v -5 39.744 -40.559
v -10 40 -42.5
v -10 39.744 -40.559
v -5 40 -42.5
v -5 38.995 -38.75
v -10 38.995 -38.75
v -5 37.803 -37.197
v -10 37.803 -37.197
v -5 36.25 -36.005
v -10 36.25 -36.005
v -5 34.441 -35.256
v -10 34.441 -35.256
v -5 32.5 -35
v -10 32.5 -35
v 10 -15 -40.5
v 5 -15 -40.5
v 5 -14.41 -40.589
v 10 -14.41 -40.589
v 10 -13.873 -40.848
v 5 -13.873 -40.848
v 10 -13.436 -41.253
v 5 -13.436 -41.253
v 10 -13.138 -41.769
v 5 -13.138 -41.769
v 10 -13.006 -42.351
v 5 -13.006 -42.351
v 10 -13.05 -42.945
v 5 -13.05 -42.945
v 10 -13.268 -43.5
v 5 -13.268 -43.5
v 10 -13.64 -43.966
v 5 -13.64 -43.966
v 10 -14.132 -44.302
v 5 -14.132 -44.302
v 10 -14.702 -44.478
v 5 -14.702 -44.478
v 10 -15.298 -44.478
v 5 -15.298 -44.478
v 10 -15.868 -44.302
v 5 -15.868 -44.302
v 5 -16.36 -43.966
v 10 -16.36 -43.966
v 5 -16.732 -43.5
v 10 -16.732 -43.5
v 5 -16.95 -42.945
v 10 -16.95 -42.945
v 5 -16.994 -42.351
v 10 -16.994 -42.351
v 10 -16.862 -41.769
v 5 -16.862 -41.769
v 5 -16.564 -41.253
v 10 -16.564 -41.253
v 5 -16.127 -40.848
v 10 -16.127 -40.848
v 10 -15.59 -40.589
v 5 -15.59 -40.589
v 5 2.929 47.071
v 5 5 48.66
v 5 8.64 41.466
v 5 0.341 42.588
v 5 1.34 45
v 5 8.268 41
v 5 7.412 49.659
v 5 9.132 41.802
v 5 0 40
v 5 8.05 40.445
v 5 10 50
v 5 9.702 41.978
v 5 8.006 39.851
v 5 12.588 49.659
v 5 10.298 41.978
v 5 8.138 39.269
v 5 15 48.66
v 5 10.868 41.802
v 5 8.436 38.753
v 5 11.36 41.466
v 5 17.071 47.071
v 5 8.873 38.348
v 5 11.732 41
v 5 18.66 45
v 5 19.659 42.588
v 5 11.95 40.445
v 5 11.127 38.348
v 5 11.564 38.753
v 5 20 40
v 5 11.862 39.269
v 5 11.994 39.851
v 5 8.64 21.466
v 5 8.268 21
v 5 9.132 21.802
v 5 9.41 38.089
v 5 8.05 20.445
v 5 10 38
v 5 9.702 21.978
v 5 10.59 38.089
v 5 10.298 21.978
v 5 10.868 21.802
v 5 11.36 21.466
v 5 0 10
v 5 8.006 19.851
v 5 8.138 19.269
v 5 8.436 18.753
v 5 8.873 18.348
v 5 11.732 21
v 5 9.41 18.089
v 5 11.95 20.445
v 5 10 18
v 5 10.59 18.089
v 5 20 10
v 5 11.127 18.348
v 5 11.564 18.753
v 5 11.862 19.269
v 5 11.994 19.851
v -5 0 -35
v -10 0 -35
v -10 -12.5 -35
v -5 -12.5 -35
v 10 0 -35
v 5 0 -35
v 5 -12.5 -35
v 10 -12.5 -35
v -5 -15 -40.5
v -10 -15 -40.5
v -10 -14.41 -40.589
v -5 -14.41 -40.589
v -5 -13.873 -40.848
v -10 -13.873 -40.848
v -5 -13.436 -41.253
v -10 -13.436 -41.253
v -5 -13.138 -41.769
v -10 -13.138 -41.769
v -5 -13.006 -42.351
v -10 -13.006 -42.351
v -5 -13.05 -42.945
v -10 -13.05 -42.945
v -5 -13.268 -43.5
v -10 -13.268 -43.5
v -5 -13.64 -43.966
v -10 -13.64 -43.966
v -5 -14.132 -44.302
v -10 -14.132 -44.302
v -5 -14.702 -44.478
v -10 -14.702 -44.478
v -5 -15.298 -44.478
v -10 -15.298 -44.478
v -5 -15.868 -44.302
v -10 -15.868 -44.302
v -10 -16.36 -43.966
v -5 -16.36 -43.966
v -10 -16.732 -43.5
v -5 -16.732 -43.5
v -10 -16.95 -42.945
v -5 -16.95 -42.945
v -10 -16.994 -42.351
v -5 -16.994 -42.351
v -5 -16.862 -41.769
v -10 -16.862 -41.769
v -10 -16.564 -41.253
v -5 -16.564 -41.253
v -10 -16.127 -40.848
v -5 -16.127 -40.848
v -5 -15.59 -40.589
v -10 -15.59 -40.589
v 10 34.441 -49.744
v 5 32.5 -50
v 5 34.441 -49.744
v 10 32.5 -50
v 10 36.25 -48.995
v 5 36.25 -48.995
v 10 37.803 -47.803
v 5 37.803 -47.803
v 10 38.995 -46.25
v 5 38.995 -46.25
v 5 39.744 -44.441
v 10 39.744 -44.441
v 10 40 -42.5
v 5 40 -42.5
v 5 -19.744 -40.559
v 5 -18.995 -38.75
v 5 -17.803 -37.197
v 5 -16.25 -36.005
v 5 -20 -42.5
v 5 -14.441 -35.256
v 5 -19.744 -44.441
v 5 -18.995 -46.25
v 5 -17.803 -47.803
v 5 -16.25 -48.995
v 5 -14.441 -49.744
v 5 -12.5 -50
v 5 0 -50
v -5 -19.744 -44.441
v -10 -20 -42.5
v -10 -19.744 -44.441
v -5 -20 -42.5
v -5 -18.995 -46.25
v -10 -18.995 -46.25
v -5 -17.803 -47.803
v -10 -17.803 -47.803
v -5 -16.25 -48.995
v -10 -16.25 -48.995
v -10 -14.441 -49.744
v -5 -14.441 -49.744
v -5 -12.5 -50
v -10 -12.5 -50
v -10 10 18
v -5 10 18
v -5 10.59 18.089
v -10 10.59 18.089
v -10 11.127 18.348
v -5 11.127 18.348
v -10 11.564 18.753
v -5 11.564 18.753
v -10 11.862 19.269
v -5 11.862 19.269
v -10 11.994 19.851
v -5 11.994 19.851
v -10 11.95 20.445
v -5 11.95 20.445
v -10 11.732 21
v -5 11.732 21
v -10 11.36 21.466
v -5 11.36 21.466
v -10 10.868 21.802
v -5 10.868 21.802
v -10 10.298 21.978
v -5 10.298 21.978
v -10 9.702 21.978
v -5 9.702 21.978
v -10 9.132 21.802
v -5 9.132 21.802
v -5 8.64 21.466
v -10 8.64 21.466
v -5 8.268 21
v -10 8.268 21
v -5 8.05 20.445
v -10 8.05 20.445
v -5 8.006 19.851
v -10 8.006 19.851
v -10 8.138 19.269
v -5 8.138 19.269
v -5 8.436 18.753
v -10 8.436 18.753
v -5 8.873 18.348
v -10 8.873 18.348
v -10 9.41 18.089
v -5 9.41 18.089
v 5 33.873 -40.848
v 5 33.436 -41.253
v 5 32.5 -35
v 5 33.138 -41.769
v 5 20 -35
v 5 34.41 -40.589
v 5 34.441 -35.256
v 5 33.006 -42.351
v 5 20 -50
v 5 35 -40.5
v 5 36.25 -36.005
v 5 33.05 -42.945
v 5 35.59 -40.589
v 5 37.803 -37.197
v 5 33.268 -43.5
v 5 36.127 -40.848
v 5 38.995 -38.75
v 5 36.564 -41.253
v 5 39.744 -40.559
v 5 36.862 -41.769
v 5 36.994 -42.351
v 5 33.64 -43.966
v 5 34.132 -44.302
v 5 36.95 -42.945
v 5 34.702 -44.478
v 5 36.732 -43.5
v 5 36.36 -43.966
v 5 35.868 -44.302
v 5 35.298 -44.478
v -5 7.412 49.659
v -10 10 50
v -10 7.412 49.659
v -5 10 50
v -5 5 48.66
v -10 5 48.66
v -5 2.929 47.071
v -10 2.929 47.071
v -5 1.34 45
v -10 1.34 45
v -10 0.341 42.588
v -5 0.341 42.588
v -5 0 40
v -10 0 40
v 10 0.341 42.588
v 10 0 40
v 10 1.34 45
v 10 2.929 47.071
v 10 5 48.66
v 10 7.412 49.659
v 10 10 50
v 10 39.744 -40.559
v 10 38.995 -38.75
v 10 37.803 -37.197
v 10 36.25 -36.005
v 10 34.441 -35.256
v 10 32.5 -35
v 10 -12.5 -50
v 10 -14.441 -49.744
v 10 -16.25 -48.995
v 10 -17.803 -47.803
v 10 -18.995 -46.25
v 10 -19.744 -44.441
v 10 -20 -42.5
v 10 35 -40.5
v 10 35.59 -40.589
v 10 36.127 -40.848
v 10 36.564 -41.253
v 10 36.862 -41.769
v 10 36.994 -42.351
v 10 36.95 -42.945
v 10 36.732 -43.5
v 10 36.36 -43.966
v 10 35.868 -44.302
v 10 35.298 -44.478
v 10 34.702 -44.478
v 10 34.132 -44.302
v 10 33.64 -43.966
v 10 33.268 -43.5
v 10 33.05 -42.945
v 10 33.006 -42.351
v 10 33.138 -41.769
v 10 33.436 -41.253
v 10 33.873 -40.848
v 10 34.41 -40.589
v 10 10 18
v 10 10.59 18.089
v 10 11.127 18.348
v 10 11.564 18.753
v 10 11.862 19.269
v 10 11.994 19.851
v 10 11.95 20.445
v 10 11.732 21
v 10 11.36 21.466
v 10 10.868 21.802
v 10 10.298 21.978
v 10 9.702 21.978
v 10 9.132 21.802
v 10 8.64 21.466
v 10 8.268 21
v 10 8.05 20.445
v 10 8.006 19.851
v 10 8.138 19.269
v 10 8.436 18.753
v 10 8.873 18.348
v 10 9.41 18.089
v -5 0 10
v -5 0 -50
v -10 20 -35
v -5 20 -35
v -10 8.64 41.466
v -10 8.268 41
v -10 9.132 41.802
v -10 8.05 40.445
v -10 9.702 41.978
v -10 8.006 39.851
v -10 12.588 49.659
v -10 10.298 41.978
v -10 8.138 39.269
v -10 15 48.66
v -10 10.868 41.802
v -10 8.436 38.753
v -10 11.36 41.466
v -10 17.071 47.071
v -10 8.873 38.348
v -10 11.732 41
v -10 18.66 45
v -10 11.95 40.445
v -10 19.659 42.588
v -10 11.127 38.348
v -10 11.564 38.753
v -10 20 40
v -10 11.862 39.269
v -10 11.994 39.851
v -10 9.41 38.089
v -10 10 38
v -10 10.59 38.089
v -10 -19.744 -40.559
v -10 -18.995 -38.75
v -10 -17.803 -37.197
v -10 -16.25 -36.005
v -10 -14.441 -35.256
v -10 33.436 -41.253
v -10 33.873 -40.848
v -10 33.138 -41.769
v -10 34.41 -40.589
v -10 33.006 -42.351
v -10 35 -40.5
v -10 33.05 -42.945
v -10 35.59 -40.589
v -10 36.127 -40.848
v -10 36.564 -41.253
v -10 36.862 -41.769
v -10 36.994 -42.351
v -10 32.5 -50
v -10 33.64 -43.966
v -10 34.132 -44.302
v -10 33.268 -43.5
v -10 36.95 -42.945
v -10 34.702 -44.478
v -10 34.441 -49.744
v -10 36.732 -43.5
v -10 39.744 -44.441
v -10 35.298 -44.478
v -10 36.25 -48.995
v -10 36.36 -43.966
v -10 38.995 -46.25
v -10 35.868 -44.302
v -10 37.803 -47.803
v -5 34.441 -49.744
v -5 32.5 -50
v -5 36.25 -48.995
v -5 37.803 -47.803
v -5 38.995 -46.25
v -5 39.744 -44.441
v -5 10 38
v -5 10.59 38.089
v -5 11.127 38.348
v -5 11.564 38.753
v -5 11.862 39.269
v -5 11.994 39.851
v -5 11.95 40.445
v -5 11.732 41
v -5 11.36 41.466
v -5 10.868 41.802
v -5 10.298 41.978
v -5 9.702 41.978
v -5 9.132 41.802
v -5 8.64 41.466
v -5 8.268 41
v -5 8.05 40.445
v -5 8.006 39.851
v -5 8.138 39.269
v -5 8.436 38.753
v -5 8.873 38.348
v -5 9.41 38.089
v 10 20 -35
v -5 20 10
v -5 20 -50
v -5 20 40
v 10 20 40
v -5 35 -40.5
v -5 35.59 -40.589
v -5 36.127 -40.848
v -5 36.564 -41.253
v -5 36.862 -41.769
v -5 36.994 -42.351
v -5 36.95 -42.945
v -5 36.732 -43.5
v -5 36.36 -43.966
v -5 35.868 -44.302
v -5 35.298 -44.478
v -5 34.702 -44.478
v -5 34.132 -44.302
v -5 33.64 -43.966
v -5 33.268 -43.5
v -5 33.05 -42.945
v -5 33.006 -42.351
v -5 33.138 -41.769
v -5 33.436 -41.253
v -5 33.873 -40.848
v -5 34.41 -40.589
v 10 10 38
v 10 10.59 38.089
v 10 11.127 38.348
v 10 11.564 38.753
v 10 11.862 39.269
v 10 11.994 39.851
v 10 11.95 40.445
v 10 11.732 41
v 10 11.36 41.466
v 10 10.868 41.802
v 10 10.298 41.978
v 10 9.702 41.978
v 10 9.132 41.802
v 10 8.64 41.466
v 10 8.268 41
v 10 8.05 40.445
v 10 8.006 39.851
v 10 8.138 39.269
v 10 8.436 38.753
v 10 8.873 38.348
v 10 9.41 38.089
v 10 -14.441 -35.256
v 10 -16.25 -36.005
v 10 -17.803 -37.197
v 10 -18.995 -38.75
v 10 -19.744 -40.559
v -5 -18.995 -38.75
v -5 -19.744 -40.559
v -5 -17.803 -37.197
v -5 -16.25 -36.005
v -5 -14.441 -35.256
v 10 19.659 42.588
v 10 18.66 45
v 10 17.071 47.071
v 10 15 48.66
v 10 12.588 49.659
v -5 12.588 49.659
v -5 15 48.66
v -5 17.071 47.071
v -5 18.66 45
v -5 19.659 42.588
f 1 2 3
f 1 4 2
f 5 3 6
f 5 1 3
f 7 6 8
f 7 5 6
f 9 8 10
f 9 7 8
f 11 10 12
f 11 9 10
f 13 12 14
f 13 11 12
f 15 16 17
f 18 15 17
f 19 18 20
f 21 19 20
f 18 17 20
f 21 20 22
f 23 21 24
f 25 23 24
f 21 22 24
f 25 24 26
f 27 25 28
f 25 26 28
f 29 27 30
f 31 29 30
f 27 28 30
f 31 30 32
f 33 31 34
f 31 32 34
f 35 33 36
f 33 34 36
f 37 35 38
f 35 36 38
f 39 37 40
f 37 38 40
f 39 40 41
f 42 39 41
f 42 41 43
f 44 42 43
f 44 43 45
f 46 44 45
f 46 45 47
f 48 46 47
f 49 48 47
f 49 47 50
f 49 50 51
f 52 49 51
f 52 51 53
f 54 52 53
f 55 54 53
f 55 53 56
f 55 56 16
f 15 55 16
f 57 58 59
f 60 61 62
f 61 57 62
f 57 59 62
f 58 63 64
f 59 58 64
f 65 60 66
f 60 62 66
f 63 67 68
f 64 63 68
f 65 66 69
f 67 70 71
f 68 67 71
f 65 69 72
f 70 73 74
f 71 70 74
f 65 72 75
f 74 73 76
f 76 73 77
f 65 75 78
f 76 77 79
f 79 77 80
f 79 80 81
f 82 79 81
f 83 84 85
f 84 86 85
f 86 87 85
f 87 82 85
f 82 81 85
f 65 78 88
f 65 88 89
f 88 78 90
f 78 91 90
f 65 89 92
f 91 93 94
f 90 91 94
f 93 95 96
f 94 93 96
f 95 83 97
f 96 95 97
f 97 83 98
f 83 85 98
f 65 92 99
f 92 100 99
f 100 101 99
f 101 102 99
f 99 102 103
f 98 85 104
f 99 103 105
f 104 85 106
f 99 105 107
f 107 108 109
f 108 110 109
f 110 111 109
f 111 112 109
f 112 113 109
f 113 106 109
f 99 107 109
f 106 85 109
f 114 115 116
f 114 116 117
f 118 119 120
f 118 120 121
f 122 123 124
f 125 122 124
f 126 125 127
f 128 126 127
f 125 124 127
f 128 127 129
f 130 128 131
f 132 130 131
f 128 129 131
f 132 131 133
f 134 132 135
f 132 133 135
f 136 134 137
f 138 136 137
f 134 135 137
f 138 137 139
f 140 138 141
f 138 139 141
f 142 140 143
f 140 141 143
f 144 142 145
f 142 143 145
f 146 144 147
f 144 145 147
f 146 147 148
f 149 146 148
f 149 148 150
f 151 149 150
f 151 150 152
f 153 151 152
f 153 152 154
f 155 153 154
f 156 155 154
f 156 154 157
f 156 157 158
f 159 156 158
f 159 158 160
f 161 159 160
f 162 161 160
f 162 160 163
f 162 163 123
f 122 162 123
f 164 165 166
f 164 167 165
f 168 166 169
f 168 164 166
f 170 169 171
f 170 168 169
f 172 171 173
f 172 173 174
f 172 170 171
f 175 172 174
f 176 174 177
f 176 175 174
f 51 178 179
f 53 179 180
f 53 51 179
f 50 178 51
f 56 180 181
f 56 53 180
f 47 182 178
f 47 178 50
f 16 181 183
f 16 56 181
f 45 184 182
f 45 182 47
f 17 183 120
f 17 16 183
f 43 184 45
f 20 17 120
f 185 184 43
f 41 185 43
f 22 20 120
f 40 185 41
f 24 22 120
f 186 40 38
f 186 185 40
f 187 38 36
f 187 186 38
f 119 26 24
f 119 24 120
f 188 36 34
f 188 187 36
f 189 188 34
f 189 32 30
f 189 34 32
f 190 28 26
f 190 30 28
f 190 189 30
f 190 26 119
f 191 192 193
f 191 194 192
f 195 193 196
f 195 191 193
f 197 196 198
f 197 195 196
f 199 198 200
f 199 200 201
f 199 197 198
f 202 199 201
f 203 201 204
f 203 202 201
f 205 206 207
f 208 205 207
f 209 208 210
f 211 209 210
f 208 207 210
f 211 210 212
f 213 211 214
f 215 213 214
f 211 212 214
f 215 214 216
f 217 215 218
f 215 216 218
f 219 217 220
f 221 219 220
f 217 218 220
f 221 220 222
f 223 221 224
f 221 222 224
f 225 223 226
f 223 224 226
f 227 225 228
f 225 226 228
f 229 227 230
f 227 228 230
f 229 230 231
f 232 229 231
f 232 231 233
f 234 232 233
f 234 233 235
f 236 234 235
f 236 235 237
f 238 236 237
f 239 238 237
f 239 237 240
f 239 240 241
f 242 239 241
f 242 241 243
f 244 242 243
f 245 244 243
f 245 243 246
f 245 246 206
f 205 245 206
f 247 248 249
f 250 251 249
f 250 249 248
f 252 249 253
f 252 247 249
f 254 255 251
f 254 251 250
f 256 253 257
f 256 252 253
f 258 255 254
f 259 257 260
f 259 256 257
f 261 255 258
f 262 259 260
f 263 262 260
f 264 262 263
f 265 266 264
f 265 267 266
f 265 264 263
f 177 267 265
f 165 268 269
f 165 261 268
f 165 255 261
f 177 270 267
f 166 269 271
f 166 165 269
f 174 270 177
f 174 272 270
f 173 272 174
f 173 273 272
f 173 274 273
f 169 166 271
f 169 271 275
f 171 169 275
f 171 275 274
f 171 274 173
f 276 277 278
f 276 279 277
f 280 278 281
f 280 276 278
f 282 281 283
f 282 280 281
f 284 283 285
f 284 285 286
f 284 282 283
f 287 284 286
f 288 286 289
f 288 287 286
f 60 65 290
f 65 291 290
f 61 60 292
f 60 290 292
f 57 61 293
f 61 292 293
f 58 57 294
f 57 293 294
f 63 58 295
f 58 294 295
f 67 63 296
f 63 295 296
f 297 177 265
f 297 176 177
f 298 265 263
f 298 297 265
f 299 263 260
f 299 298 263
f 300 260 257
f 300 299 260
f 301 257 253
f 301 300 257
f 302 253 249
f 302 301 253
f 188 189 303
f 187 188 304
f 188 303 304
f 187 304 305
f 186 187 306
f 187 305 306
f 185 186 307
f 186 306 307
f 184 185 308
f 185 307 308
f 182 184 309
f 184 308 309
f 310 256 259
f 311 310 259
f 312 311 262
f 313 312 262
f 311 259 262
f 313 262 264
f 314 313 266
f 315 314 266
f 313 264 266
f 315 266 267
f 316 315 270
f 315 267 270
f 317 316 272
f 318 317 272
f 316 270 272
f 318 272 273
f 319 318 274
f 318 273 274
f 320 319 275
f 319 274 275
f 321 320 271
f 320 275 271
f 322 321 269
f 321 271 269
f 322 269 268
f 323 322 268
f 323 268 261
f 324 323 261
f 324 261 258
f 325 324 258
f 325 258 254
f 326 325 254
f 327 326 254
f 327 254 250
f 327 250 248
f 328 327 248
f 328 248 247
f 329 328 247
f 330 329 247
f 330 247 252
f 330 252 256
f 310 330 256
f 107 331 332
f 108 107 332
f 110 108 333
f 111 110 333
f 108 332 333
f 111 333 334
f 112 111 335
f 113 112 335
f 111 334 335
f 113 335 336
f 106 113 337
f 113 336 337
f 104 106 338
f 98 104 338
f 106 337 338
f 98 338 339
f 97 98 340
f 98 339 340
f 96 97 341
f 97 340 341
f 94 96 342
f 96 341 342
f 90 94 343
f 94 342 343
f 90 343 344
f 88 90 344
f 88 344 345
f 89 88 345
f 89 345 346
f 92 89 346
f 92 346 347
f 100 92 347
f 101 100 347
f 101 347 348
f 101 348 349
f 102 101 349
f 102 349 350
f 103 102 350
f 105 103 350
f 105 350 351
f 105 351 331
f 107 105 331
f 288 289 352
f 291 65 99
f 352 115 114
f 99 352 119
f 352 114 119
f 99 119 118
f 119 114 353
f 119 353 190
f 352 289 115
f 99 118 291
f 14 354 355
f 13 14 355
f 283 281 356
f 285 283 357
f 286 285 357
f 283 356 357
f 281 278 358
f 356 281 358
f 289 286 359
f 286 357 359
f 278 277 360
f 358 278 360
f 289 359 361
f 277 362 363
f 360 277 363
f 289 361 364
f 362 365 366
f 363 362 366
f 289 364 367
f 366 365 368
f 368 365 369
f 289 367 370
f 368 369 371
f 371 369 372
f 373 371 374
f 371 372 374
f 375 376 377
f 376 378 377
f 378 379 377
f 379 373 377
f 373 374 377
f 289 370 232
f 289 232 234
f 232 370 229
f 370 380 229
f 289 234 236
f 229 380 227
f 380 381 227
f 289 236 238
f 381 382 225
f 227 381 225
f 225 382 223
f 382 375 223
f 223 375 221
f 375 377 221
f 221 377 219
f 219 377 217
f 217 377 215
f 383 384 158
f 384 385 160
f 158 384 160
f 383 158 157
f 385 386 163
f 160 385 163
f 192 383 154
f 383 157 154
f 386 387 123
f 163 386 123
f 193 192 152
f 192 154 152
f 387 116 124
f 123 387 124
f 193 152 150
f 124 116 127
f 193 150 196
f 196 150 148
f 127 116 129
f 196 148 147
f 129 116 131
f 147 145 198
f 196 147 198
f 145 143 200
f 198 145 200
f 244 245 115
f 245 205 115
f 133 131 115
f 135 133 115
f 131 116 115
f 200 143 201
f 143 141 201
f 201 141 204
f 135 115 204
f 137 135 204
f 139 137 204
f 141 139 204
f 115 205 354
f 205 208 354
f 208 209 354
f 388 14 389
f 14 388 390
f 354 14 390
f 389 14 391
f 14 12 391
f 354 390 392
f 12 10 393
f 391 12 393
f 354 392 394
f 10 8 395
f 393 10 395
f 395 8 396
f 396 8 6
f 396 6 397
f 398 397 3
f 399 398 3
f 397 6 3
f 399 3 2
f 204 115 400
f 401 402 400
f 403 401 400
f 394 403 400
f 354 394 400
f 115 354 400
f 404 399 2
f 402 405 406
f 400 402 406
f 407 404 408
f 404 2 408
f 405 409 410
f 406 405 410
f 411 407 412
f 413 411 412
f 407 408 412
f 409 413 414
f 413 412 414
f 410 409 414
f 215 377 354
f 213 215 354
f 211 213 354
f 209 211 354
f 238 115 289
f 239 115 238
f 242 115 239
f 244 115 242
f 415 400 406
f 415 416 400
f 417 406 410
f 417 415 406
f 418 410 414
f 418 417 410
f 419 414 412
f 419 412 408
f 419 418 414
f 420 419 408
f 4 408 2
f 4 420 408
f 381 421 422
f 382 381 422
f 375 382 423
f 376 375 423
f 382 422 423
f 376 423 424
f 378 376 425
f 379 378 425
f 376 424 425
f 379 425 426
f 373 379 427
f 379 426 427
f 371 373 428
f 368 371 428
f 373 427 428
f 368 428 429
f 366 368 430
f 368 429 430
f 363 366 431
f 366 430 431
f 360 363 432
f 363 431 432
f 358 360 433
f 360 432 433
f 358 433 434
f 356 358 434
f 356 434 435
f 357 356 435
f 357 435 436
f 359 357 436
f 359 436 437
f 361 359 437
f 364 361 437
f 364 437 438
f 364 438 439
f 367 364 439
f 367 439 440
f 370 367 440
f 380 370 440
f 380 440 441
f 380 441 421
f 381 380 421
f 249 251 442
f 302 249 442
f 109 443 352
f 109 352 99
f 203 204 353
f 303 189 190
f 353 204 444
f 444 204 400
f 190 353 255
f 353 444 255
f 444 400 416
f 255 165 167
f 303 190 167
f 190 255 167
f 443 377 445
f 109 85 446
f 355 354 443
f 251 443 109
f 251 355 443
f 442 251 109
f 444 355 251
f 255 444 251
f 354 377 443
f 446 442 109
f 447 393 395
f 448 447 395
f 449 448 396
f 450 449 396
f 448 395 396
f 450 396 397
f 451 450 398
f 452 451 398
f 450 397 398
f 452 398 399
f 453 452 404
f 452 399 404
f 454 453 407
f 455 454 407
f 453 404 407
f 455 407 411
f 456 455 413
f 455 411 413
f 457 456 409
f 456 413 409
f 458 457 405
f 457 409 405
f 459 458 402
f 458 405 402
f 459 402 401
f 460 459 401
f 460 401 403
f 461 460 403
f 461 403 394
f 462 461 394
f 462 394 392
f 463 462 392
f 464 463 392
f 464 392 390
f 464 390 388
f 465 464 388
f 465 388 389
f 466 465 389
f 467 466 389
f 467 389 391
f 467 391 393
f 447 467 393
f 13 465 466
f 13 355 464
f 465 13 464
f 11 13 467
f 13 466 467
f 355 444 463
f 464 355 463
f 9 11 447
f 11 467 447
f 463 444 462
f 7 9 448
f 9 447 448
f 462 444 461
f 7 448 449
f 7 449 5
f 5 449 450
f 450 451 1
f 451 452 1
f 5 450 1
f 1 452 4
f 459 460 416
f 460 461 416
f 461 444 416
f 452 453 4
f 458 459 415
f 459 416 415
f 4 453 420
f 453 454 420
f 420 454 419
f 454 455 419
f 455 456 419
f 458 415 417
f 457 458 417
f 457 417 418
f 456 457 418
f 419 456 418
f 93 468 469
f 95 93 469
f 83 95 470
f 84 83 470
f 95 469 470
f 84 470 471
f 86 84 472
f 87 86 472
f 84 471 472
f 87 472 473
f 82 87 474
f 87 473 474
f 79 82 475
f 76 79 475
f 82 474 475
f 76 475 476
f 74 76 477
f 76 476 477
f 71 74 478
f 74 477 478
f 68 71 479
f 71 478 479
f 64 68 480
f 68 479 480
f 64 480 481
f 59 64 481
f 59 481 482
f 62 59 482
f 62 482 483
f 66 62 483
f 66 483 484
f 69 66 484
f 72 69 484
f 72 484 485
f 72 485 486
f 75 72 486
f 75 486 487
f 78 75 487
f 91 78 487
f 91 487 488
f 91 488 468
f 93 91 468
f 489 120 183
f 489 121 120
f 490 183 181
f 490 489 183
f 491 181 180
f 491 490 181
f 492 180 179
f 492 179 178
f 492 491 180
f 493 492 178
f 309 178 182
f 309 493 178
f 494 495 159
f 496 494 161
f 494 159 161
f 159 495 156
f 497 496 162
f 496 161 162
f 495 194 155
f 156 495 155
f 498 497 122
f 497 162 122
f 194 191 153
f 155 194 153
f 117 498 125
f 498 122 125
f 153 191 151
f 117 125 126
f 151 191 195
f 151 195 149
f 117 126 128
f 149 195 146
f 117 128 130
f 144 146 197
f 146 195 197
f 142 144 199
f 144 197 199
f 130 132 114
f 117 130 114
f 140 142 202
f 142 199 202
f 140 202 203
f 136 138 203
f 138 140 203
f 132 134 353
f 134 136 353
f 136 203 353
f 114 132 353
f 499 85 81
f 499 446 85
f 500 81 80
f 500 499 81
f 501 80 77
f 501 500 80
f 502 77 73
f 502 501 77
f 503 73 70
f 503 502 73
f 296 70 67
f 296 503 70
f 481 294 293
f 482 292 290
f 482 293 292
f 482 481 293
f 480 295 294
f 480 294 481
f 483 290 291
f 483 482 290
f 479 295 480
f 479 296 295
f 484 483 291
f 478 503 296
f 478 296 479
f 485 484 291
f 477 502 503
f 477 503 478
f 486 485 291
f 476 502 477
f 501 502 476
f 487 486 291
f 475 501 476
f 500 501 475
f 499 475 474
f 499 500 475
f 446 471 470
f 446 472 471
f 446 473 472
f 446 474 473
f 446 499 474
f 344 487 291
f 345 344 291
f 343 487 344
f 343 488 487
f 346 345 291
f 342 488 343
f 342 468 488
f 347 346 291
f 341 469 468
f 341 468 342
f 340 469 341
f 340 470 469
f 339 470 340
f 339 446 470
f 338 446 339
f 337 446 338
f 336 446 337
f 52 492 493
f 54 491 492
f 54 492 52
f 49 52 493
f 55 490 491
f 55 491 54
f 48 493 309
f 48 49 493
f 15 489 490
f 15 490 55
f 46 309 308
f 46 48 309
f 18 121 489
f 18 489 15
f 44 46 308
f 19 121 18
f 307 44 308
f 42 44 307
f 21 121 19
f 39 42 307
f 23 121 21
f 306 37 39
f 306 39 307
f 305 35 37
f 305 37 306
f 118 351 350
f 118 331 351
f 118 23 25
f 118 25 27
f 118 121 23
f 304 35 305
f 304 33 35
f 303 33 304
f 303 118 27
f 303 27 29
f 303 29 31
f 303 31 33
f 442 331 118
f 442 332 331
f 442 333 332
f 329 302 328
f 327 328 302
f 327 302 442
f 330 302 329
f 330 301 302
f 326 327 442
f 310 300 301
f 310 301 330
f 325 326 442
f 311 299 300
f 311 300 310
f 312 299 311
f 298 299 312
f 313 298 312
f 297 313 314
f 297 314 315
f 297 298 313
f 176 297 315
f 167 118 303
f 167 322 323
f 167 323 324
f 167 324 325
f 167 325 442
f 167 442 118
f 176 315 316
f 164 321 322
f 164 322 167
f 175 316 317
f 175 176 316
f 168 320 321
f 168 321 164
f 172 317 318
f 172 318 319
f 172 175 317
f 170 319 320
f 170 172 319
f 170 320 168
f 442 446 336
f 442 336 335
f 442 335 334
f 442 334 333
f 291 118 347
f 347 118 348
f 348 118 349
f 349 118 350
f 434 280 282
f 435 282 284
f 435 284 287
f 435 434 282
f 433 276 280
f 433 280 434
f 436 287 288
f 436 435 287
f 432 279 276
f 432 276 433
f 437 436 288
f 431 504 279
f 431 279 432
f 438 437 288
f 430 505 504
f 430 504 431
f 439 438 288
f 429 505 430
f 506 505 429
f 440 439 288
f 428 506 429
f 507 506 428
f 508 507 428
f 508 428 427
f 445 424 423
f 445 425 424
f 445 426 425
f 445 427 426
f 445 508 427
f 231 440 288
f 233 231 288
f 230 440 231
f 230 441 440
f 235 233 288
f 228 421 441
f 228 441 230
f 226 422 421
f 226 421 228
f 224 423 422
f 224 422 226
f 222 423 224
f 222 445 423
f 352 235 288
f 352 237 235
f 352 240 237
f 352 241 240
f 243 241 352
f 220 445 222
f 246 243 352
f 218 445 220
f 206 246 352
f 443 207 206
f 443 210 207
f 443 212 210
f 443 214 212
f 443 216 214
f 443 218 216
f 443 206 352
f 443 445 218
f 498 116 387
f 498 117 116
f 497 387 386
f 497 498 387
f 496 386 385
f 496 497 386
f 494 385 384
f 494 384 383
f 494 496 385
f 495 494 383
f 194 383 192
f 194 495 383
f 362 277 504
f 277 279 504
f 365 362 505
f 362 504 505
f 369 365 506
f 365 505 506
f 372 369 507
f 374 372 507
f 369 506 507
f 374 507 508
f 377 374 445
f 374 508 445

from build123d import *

# Parameters (mm, degrees)
SKETCH1_W           = 20
SKETCH1_H           = 100
BOSS_EXTRUDE1_DEPTH = 20
SKETCH2_W           = 10
SKETCH2_H           = 40
CUT_EXTRUDE1_DEPTH  = 55.772255751
SKETCH3_R           = 2
CUT_EXTRUDE2_DEPTH  = 58.445626465
FILLET1_R           = 10
SKETCH4_W           = 20
SKETCH4_H           = 15
BOSS_EXTRUDE2_DEPTH = 20
SKETCH5_R           = 2
CUT_EXTRUDE3_DEPTH  = 68.082039325
CUT_EXTRUDE4_REACH  = 110.167
SKETCH6_W           = 10
SKETCH6_H           = 20
FILLET2_R           = 7.5


with BuildPart() as part:
    # Sketch1 → Boss-Extrude1 (new body)
    with BuildSketch(Plane(origin=(0, 0, 0), x_dir=(1, 0, 0), z_dir=(0, 1, 0))):
        Rectangle(SKETCH1_W, SKETCH1_H)
    extrude(amount=BOSS_EXTRUDE1_DEPTH)

    # Sketch2 → Cut-Extrude1 (cut, through all)
    with BuildSketch(Plane(origin=(0, 20, 0), x_dir=(1, 0, 0), z_dir=(0, 1, 0))):
        with Locations((0, -30)):
            Rectangle(SKETCH2_W, SKETCH2_H)
    extrude(amount=-CUT_EXTRUDE1_DEPTH, mode=Mode.SUBTRACT)

    # Sketch3 → Cut-Extrude2 (cut, through all)
    with BuildSketch(Plane(origin=(10, 0, 0), x_dir=(0, 0, -1), z_dir=(1, 0, 0))):
        with Locations((-40, 10)):
            Circle(SKETCH3_R)
        with Locations((-20, 10)):
            Circle(SKETCH3_R)
    extrude(amount=-CUT_EXTRUDE2_DEPTH, mode=Mode.SUBTRACT)

    # Fillet1
    fillet1_edges = [part.edges().sort_by_distance(p)[0] for p in [
        (7.5, 0, 50),
        (-7.5, 0, 50),
        (-7.5, 20, 50),
        (7.5, 20, 50),
    ]]
    fillet(fillet1_edges, radius=FILLET1_R - 0.0001)  # a hair under: the kernel refuses the full size

    # Sketch4 → Boss-Extrude2 (add)
    with BuildSketch(Plane(origin=(0, 20, 0), x_dir=(1, 0, 0), z_dir=(0, 1, 0))):
        with Locations((0, 42.5)):
            Rectangle(SKETCH4_W, SKETCH4_H)
    boss_extrude2 = extrude(amount=BOSS_EXTRUDE2_DEPTH)

    # Mirror1: Boss-Extrude2 across plane
    add(boss_extrude2.mirror(Plane.ZX.offset(10)))

    # Sketch5 → Cut-Extrude3 (cut, through all)
    with BuildSketch(Plane.ZY.offset(10)):
        with Locations((-42.5, 35)):
            Circle(SKETCH5_R)
        with Locations((-42.5, -15)):
            Circle(SKETCH5_R)
    extrude(amount=-CUT_EXTRUDE3_DEPTH, mode=Mode.SUBTRACT)

    # Sketch6 → Cut-Extrude4 (cut, up to next)
    with BuildSketch(Plane(origin=(0, 0, -50), x_dir=(-1, 0, 0), z_dir=(0, 0, -1)), mode=Mode.PRIVATE) as cut_extrude4_sk1:
        with Locations((0, 30)):
            Rectangle(SKETCH6_W, SKETCH6_H)
    cut_extrude4_tool1 = extrude(cut_extrude4_sk1.sketch, amount=-CUT_EXTRUDE4_REACH, mode=Mode.PRIVATE) & part.part
    # Sketch6 → Cut-Extrude4 (cut, up to next)
    with BuildSketch(Plane(origin=(0, 0, -50), x_dir=(-1, 0, 0), z_dir=(0, 0, -1)), mode=Mode.PRIVATE) as cut_extrude4_sk2:
        with Locations((0, -10)):
            Rectangle(SKETCH6_W, SKETCH6_H)
    cut_extrude4_tool2 = extrude(cut_extrude4_sk2.sketch, amount=-CUT_EXTRUDE4_REACH, mode=Mode.PRIVATE) & part.part
    add(cut_extrude4_tool1.solids().sort_by_distance((0, 30, -50))[0], mode=Mode.SUBTRACT)
    add(cut_extrude4_tool2.solids().sort_by_distance((0, -10, -50))[0], mode=Mode.SUBTRACT)

    # Fillet2
    fillet2_edges = [part.edges().sort_by_distance(p)[0] for p in [
        (-7.5, 40, -35),
        (-7.5, 40, -50),
        (7.5, 40, -35),
        (7.5, 40, -50),
        (7.5, -20, -35),
        (7.5, -20, -50),
        (-7.5, -20, -35),
        (-7.5, -20, -50),
    ]]
    fillet(fillet2_edges, radius=FILLET2_R - 0.0001)  # a hair under: the kernel refuses the full size


solid = part.part
